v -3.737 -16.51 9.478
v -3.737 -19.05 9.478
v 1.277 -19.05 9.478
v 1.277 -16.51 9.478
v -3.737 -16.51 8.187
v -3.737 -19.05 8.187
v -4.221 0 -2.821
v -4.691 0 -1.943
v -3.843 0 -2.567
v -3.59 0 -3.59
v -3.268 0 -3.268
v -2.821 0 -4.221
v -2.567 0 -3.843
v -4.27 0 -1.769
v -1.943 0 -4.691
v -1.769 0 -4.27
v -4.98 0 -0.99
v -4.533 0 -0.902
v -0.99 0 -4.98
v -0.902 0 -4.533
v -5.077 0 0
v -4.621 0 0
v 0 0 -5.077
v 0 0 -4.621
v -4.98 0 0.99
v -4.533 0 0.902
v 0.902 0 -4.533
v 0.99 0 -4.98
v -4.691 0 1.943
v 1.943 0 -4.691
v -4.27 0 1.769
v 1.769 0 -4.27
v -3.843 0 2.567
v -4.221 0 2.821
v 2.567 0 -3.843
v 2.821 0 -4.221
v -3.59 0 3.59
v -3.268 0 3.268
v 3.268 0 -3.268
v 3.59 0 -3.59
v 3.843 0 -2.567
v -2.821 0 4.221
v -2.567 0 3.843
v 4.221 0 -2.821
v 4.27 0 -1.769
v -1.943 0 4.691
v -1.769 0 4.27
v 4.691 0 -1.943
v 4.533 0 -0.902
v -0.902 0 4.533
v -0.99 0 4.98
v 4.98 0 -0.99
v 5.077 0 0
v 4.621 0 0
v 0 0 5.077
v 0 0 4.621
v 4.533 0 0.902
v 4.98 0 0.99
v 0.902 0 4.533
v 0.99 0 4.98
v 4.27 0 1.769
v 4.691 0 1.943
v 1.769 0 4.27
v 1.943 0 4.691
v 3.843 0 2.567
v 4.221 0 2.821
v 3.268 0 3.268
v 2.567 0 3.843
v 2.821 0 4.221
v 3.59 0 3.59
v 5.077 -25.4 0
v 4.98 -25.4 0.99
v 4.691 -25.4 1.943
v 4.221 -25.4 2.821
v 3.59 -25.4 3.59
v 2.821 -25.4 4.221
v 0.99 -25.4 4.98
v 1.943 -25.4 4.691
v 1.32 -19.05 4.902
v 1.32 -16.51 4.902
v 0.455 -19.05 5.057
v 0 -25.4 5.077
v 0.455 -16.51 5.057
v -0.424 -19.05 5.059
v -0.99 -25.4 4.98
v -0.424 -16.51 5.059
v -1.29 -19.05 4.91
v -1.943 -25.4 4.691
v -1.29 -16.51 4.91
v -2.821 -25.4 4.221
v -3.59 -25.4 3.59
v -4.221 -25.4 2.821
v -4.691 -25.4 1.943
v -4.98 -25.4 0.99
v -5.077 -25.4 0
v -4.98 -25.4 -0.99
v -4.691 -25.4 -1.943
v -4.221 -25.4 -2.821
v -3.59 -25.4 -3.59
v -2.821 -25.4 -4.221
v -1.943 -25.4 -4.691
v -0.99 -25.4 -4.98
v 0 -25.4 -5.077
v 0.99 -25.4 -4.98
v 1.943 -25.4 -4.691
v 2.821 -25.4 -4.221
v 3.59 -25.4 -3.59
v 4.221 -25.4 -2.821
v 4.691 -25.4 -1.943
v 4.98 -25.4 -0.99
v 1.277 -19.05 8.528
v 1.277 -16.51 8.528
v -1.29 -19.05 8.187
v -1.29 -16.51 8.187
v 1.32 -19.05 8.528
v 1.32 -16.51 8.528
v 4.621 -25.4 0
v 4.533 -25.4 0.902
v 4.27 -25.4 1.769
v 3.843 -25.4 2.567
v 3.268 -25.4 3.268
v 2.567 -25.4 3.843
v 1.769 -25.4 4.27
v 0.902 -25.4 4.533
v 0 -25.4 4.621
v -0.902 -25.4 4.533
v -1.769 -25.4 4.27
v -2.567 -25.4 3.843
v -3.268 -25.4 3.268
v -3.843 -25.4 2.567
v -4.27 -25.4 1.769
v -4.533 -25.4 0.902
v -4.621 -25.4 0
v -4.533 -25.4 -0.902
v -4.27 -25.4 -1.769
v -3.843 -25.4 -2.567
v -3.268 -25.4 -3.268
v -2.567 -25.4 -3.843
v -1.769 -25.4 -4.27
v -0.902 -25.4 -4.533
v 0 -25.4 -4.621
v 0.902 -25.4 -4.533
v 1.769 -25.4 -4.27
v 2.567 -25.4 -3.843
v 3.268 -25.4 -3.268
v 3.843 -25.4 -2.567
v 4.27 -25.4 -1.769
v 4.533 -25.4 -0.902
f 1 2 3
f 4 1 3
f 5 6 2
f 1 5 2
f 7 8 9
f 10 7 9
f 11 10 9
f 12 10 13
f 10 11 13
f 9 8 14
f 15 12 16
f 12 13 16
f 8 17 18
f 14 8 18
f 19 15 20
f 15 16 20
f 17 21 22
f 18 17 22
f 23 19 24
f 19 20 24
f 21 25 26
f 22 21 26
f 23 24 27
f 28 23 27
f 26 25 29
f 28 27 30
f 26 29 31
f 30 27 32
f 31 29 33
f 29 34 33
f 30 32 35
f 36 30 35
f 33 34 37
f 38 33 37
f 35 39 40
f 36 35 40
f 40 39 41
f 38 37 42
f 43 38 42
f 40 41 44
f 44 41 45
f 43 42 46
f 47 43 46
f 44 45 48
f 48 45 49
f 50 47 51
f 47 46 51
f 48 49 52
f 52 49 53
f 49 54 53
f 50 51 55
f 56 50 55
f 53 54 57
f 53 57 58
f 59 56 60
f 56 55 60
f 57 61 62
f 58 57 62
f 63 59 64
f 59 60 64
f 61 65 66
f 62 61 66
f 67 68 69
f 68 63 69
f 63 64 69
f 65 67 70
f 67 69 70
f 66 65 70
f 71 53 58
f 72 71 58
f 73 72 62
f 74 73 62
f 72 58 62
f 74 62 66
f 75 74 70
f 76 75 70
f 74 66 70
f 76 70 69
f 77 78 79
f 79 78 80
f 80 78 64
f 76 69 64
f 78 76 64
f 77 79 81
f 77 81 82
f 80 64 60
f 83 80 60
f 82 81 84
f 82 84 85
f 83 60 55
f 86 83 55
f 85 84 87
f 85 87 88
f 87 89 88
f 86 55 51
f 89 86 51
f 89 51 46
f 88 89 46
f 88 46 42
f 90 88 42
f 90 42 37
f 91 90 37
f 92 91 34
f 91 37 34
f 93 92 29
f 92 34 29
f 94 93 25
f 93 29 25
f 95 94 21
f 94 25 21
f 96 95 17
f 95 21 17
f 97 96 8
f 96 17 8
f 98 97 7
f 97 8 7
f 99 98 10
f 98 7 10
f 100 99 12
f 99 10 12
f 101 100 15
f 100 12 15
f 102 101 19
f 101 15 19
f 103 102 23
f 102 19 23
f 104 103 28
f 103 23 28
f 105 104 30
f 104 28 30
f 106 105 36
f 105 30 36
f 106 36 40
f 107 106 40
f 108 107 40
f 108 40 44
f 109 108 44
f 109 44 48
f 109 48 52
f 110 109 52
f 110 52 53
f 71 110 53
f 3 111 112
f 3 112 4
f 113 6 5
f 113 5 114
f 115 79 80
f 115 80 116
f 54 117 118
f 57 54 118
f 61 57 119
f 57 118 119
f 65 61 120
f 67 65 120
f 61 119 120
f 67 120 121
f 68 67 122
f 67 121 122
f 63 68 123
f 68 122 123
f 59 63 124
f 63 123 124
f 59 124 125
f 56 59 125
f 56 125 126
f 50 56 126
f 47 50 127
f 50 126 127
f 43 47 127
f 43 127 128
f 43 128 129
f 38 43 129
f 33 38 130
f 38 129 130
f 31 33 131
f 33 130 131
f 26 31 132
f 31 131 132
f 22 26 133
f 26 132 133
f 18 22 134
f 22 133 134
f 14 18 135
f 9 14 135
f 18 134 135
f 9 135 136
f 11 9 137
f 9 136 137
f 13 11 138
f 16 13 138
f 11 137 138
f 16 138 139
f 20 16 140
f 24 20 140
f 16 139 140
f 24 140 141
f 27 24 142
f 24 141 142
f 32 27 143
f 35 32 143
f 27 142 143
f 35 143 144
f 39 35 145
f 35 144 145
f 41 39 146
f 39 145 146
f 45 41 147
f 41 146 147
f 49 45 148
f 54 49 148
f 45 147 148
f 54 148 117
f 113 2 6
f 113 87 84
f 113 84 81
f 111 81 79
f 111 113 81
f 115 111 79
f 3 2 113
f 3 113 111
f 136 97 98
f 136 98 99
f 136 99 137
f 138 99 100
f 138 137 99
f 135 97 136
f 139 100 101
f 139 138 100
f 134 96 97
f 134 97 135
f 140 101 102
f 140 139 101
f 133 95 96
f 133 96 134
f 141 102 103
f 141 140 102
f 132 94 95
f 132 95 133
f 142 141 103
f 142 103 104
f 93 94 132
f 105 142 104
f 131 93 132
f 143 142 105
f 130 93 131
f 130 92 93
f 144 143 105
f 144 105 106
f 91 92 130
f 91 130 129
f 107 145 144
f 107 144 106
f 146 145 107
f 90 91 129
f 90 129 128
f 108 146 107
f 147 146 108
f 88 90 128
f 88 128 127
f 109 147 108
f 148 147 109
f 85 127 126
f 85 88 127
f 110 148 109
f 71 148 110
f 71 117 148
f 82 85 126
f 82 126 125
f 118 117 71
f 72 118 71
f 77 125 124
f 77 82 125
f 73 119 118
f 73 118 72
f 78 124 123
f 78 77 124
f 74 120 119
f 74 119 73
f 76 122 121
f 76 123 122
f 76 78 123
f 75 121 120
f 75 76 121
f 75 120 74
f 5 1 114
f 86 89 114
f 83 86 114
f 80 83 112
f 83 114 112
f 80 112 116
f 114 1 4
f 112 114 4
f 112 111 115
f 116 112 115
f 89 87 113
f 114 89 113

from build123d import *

# Parameters (mm, degrees)
F0_R     = 5.077075
F1_DEPTH = 25.4
F2_R     = 4.621365
F3_DEPTH = 25.4
F5_W     = 2.610316
F5_H     = 3.654443
F6_DEPTH = 2.54
F7_W     = 5.013653
F7_H     = 1.290941
F8_DEPTH = 2.54


with BuildPart() as f1:
    # F0 (on Front) → F1 (new body)
    with BuildSketch(Plane.XZ):
        Circle(F0_R)
    extrude(amount=F1_DEPTH)

    # F2 (on face) → F3 (cut)
    with BuildSketch(Plane.XZ.offset(25.4)):
        Circle(F2_R)
    extrude(amount=-F3_DEPTH, mode=Mode.SUBTRACT)

    # F5 (on offset) → F6 (join)
    with BuildSketch(Plane.XZ.offset(19.05)):
        with Locations((0.015271, 6.700735)):
            Rectangle(F5_W, F5_H)
    extrude(amount=-F6_DEPTH)

    # F7 (on offset) → F8 (join)
    with BuildSketch(Plane.XZ.offset(19.05)):
        with Locations((-1.230061, 8.832033)):
            Rectangle(F7_W, F7_H)
    extrude(amount=-F8_DEPTH)


solid = f1.part
